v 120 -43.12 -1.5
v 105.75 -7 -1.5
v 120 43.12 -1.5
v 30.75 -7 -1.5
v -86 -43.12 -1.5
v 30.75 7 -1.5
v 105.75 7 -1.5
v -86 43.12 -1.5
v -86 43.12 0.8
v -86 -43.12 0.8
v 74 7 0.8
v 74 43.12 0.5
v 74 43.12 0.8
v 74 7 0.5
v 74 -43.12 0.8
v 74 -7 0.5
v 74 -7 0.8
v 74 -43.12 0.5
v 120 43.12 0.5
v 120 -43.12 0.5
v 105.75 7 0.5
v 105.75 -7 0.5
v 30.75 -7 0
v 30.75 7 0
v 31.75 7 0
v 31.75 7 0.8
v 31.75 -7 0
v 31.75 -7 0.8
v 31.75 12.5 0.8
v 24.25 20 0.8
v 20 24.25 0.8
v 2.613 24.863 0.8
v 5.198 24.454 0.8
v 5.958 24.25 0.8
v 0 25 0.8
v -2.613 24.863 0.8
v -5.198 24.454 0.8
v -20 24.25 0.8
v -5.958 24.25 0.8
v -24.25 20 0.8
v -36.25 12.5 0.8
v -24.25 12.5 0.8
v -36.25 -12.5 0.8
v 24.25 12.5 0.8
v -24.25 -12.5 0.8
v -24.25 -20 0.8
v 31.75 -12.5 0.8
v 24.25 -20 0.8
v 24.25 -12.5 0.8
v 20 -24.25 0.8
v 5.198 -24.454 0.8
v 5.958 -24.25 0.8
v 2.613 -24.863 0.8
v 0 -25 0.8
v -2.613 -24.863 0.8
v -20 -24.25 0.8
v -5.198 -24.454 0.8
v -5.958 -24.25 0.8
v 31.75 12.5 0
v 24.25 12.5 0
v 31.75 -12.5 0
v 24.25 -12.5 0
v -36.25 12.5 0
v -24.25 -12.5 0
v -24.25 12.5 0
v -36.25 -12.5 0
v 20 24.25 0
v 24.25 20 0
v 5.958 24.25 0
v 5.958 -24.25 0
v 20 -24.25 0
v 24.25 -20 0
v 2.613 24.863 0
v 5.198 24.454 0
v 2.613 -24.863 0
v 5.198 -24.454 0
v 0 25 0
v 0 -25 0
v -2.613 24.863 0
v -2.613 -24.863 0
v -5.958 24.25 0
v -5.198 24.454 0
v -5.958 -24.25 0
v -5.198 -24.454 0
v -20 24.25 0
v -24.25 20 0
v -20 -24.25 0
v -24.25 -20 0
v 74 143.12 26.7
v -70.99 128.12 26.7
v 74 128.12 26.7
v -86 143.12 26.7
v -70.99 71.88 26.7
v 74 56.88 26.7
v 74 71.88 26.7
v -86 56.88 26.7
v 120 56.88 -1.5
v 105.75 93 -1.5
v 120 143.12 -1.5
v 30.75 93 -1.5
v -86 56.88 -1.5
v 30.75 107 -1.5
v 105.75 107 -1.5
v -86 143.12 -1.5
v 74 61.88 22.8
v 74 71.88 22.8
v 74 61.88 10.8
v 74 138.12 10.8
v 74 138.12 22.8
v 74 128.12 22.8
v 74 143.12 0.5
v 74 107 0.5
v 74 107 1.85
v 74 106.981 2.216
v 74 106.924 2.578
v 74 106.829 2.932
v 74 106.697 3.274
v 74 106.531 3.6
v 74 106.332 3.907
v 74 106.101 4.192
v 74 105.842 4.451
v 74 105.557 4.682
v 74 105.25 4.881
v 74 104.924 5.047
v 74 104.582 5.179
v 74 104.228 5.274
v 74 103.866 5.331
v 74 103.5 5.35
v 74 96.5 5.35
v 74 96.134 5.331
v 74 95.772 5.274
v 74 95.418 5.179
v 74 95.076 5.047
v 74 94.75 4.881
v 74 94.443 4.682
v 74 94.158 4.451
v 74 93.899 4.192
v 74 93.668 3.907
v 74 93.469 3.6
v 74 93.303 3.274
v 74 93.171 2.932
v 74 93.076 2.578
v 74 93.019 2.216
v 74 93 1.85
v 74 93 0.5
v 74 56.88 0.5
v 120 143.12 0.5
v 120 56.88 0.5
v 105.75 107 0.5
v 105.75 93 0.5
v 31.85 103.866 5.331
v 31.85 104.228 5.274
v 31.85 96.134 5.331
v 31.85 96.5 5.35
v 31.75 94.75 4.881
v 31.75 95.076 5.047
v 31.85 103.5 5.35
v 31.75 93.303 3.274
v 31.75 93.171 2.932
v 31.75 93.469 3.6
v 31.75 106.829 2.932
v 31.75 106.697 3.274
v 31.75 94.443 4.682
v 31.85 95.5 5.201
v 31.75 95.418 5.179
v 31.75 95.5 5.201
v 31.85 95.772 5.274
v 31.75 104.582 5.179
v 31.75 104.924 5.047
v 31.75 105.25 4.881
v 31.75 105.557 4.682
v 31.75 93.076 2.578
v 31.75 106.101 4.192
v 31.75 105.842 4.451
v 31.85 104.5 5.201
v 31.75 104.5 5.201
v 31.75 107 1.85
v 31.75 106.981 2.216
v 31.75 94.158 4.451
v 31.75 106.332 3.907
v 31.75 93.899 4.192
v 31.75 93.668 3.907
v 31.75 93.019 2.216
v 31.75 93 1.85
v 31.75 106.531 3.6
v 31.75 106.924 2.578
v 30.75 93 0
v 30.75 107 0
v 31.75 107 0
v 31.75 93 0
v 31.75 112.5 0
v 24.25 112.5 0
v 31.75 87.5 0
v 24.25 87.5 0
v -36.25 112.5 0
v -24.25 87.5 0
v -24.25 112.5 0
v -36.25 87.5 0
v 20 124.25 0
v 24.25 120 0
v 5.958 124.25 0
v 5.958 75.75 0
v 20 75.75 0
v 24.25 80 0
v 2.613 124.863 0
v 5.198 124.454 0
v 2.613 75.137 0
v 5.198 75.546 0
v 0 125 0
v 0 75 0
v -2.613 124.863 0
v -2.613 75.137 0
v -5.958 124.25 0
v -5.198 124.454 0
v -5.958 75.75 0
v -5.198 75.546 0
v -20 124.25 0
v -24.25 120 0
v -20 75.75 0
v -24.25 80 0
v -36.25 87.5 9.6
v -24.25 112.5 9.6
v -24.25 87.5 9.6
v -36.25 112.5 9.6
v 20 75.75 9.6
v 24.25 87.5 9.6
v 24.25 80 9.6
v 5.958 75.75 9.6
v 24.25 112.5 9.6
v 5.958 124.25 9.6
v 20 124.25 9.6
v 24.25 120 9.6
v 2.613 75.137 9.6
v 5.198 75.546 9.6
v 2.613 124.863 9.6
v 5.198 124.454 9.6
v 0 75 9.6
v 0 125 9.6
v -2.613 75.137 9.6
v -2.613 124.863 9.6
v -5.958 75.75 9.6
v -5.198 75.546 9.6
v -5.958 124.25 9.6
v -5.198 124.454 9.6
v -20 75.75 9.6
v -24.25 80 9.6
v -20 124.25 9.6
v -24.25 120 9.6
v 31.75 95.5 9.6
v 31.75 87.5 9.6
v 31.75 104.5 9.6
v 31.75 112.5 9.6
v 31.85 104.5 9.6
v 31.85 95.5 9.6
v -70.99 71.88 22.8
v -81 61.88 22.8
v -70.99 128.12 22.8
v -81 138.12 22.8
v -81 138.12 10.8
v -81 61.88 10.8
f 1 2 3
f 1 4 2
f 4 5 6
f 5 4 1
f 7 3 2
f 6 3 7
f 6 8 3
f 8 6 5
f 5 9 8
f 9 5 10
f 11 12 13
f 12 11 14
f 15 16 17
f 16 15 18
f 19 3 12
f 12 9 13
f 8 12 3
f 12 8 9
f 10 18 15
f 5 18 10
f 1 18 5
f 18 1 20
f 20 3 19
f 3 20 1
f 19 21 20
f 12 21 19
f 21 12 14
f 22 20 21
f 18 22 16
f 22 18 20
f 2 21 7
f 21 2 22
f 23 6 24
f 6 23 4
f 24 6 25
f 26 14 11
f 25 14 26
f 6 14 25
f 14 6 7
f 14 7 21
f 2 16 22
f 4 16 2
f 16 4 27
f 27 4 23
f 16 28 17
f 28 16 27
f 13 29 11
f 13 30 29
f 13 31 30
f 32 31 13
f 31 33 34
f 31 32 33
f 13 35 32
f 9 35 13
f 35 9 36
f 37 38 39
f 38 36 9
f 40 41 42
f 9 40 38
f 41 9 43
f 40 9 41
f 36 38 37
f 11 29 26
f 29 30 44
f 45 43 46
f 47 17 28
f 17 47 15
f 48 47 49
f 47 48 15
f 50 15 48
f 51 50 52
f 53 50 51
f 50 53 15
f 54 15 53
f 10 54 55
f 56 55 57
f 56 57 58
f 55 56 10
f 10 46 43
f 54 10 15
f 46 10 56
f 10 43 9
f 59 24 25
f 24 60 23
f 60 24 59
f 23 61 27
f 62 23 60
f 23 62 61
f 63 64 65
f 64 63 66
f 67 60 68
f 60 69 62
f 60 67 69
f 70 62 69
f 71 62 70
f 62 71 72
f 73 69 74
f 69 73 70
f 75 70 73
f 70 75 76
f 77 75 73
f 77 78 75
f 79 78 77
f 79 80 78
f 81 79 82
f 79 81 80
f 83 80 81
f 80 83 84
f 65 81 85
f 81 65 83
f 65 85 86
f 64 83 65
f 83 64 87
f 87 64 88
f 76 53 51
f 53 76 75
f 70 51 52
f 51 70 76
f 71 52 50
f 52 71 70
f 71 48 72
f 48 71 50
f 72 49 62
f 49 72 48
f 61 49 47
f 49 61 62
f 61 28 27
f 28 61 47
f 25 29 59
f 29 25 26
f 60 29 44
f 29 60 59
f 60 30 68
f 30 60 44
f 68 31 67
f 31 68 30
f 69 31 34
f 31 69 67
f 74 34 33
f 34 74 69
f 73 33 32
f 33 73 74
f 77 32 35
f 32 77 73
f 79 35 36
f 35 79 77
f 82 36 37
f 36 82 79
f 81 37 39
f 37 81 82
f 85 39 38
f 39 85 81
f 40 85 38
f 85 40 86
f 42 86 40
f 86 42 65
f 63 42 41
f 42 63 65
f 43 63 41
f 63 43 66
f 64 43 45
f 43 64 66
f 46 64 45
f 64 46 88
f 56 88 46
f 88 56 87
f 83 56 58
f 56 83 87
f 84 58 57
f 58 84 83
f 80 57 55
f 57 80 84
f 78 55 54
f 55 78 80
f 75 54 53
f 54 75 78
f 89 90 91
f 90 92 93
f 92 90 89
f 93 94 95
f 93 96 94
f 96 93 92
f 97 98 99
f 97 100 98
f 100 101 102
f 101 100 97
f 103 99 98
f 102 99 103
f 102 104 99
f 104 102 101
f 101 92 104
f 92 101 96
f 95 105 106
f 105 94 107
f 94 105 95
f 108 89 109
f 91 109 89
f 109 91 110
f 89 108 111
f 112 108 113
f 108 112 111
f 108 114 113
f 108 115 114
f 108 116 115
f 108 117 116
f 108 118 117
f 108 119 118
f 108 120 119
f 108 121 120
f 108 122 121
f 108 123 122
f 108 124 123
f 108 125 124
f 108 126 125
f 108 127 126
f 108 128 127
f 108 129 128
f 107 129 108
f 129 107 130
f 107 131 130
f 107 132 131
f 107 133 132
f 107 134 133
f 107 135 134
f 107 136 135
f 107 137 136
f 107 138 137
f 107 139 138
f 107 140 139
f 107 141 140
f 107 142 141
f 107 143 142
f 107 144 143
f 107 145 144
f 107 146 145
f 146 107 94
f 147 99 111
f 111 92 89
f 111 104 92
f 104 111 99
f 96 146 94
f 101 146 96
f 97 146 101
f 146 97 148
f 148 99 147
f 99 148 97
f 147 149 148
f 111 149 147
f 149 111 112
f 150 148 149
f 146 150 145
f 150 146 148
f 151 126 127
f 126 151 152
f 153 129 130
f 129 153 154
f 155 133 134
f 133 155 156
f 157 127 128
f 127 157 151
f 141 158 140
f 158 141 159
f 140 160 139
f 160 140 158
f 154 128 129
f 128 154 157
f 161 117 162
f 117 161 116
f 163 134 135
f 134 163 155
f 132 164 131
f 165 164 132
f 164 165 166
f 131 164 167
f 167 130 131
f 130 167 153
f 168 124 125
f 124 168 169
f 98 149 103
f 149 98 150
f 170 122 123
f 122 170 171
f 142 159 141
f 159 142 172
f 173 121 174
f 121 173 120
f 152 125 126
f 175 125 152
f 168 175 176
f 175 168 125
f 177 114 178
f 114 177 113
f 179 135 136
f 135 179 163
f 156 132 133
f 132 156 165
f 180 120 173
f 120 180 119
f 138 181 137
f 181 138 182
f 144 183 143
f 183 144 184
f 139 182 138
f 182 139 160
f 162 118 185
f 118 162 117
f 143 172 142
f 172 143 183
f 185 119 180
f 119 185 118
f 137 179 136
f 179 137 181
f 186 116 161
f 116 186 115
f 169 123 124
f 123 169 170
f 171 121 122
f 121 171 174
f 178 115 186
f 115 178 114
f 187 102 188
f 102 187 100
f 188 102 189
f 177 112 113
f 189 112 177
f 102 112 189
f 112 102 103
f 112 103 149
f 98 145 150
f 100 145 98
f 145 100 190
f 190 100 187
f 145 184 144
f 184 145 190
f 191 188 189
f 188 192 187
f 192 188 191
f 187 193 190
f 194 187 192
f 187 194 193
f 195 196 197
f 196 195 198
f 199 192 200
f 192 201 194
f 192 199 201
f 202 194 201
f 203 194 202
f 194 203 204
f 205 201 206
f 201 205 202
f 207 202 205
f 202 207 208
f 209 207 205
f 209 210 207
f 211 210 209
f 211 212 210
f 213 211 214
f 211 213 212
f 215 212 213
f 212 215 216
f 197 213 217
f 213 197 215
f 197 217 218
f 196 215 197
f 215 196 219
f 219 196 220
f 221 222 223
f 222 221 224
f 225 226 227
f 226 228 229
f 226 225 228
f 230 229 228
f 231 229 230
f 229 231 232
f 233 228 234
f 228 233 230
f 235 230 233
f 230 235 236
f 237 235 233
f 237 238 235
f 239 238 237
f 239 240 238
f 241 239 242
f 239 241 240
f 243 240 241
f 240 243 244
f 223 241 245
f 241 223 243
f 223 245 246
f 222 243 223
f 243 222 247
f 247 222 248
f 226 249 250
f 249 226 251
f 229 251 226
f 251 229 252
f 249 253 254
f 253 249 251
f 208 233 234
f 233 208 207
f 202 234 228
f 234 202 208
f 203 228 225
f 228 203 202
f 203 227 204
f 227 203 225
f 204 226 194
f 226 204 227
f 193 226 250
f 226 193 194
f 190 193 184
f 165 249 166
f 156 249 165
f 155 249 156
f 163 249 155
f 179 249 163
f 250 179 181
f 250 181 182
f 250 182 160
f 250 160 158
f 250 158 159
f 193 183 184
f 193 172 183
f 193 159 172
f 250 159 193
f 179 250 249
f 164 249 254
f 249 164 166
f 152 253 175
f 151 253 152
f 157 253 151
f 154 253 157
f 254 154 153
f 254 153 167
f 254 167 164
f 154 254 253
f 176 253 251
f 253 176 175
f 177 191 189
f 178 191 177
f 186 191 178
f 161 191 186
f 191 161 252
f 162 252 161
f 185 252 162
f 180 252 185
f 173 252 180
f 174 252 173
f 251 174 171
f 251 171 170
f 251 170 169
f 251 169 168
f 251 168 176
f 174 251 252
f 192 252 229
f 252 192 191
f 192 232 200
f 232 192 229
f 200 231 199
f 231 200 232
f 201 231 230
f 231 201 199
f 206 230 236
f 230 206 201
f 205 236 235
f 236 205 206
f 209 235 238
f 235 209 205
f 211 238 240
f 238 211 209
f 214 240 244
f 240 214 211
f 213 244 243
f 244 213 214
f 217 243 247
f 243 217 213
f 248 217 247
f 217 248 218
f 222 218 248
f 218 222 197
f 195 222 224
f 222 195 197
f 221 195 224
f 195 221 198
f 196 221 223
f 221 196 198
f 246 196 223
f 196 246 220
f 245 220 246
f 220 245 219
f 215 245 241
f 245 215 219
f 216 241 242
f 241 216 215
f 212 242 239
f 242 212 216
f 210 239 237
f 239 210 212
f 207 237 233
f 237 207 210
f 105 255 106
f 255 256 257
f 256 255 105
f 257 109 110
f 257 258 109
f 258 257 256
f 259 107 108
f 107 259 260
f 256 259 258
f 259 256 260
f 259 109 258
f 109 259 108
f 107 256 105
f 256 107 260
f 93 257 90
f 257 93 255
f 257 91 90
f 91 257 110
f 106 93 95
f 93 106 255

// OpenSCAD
$fn=60;

module plate() {
    width=48.5; // 47.5 actual
    translate([-width/2,-width/2]) color("silver") hull() {
        translate([0,(width-40)/2,0]) cube([width,40,2]);
        translate([(width-40)/2,0,0]) cube([40,width,2]);
    }
}

module pcb(holes=true) {
    w=25; // 24 actual
    l=68; // 67 actual
    // 7mm from bottom
    color("green") translate([-48.5/2-(l-48.5)+7.5,-w/2,4.5]) difference() {
        cube([l,w,1]);
        if(holes) {            
            translate([9,1.7,-2]) cylinder(d=2.24,h=20);
            translate([9,w-1.7,-2]) cylinder(d=2.24,h=20);
            translate([l-5,1.7,-2]) cylinder(d=2.24,h=20);
            translate([l-5,w-1.7,-2]) cylinder(d=2.24,h=20);
        }
    }
    color("silver") translate([+48.5/2,-9/2,0.7])
        cube([7.6,9,3.3]);
}

module coil() {
    color("black") translate([0,0,5.5]) cylinder(d=50,h=0.85);
    color("coral") translate([0,0,5.5+0.85-0.01]) difference() {
        cylinder(d=42,h=1.4);
        translate([0,0,-1]) cylinder(d=20.4,h=3);
    }
}
module cord() {
    // 7mm by 14
    translate([47.5/2+7,-7/2,0.7+(7/2-4)+3.3/2]) rotate([90,0,90]) {
        difference() {
            hull() {
                cylinder(d=7,h=75);
                translate([7,0,0]) cylinder(d=7,h=75);
            }
            translate([-7/2,-7,-1]) cube([14,7,90]);
        }
        translate([-7/2,-7,0]) cube([14,7,75]);
    }
}

module charger(holes=true) {
    plate();
    pcb(holes);
    coil();
}
module phone(cutout=0) { // top is to the -x direction
    distance_from_charger=1.2;
    if(cutout) {
        translate([-81-cutout/2,-(76.24-cutout)/2,9.6+distance_from_charger]) cube([150,76.24-cutout,12]);
    } else {
        color("grey",alpha=.5) translate([-81,-76.24/2,9.6+distance_from_charger]) cube([150,76.24,12]);
    }
}

module holder(animate=false) {
    position= -10+$t*25 ;
    difference() {
        union() {
            translate([-5,-5,-8.2-4.1]) minkowski() { cube([10,10,9.6+3.6+3]); phone(); }
            translate([-5+150/2,-5-76.24/2,-1.5]) cube([50,86.24,2]);
        }
        if(animate) {
            translate([-6,-6,position]) minkowski() { cube([12,12,20]); phone(); } // cut for development
        }
        linear_extrude(9.6) projection(cut=false) charger(holes=false); // 7mm -> 6mm actual
        // 8.2 desired * (7/6) = 9.6
        phone();
        translate([20,0,0]) phone();
        translate([20.01,0,4]) phone(cutout=20);
        cord();
    }
}
holder(true);
if ($t > 0.2) {
    charger();
}
//cube([1,1,8.2]);

translate([0,100,0]) holder();


//linear_extrude(7) projection(cut=false) charger(holes=false);
